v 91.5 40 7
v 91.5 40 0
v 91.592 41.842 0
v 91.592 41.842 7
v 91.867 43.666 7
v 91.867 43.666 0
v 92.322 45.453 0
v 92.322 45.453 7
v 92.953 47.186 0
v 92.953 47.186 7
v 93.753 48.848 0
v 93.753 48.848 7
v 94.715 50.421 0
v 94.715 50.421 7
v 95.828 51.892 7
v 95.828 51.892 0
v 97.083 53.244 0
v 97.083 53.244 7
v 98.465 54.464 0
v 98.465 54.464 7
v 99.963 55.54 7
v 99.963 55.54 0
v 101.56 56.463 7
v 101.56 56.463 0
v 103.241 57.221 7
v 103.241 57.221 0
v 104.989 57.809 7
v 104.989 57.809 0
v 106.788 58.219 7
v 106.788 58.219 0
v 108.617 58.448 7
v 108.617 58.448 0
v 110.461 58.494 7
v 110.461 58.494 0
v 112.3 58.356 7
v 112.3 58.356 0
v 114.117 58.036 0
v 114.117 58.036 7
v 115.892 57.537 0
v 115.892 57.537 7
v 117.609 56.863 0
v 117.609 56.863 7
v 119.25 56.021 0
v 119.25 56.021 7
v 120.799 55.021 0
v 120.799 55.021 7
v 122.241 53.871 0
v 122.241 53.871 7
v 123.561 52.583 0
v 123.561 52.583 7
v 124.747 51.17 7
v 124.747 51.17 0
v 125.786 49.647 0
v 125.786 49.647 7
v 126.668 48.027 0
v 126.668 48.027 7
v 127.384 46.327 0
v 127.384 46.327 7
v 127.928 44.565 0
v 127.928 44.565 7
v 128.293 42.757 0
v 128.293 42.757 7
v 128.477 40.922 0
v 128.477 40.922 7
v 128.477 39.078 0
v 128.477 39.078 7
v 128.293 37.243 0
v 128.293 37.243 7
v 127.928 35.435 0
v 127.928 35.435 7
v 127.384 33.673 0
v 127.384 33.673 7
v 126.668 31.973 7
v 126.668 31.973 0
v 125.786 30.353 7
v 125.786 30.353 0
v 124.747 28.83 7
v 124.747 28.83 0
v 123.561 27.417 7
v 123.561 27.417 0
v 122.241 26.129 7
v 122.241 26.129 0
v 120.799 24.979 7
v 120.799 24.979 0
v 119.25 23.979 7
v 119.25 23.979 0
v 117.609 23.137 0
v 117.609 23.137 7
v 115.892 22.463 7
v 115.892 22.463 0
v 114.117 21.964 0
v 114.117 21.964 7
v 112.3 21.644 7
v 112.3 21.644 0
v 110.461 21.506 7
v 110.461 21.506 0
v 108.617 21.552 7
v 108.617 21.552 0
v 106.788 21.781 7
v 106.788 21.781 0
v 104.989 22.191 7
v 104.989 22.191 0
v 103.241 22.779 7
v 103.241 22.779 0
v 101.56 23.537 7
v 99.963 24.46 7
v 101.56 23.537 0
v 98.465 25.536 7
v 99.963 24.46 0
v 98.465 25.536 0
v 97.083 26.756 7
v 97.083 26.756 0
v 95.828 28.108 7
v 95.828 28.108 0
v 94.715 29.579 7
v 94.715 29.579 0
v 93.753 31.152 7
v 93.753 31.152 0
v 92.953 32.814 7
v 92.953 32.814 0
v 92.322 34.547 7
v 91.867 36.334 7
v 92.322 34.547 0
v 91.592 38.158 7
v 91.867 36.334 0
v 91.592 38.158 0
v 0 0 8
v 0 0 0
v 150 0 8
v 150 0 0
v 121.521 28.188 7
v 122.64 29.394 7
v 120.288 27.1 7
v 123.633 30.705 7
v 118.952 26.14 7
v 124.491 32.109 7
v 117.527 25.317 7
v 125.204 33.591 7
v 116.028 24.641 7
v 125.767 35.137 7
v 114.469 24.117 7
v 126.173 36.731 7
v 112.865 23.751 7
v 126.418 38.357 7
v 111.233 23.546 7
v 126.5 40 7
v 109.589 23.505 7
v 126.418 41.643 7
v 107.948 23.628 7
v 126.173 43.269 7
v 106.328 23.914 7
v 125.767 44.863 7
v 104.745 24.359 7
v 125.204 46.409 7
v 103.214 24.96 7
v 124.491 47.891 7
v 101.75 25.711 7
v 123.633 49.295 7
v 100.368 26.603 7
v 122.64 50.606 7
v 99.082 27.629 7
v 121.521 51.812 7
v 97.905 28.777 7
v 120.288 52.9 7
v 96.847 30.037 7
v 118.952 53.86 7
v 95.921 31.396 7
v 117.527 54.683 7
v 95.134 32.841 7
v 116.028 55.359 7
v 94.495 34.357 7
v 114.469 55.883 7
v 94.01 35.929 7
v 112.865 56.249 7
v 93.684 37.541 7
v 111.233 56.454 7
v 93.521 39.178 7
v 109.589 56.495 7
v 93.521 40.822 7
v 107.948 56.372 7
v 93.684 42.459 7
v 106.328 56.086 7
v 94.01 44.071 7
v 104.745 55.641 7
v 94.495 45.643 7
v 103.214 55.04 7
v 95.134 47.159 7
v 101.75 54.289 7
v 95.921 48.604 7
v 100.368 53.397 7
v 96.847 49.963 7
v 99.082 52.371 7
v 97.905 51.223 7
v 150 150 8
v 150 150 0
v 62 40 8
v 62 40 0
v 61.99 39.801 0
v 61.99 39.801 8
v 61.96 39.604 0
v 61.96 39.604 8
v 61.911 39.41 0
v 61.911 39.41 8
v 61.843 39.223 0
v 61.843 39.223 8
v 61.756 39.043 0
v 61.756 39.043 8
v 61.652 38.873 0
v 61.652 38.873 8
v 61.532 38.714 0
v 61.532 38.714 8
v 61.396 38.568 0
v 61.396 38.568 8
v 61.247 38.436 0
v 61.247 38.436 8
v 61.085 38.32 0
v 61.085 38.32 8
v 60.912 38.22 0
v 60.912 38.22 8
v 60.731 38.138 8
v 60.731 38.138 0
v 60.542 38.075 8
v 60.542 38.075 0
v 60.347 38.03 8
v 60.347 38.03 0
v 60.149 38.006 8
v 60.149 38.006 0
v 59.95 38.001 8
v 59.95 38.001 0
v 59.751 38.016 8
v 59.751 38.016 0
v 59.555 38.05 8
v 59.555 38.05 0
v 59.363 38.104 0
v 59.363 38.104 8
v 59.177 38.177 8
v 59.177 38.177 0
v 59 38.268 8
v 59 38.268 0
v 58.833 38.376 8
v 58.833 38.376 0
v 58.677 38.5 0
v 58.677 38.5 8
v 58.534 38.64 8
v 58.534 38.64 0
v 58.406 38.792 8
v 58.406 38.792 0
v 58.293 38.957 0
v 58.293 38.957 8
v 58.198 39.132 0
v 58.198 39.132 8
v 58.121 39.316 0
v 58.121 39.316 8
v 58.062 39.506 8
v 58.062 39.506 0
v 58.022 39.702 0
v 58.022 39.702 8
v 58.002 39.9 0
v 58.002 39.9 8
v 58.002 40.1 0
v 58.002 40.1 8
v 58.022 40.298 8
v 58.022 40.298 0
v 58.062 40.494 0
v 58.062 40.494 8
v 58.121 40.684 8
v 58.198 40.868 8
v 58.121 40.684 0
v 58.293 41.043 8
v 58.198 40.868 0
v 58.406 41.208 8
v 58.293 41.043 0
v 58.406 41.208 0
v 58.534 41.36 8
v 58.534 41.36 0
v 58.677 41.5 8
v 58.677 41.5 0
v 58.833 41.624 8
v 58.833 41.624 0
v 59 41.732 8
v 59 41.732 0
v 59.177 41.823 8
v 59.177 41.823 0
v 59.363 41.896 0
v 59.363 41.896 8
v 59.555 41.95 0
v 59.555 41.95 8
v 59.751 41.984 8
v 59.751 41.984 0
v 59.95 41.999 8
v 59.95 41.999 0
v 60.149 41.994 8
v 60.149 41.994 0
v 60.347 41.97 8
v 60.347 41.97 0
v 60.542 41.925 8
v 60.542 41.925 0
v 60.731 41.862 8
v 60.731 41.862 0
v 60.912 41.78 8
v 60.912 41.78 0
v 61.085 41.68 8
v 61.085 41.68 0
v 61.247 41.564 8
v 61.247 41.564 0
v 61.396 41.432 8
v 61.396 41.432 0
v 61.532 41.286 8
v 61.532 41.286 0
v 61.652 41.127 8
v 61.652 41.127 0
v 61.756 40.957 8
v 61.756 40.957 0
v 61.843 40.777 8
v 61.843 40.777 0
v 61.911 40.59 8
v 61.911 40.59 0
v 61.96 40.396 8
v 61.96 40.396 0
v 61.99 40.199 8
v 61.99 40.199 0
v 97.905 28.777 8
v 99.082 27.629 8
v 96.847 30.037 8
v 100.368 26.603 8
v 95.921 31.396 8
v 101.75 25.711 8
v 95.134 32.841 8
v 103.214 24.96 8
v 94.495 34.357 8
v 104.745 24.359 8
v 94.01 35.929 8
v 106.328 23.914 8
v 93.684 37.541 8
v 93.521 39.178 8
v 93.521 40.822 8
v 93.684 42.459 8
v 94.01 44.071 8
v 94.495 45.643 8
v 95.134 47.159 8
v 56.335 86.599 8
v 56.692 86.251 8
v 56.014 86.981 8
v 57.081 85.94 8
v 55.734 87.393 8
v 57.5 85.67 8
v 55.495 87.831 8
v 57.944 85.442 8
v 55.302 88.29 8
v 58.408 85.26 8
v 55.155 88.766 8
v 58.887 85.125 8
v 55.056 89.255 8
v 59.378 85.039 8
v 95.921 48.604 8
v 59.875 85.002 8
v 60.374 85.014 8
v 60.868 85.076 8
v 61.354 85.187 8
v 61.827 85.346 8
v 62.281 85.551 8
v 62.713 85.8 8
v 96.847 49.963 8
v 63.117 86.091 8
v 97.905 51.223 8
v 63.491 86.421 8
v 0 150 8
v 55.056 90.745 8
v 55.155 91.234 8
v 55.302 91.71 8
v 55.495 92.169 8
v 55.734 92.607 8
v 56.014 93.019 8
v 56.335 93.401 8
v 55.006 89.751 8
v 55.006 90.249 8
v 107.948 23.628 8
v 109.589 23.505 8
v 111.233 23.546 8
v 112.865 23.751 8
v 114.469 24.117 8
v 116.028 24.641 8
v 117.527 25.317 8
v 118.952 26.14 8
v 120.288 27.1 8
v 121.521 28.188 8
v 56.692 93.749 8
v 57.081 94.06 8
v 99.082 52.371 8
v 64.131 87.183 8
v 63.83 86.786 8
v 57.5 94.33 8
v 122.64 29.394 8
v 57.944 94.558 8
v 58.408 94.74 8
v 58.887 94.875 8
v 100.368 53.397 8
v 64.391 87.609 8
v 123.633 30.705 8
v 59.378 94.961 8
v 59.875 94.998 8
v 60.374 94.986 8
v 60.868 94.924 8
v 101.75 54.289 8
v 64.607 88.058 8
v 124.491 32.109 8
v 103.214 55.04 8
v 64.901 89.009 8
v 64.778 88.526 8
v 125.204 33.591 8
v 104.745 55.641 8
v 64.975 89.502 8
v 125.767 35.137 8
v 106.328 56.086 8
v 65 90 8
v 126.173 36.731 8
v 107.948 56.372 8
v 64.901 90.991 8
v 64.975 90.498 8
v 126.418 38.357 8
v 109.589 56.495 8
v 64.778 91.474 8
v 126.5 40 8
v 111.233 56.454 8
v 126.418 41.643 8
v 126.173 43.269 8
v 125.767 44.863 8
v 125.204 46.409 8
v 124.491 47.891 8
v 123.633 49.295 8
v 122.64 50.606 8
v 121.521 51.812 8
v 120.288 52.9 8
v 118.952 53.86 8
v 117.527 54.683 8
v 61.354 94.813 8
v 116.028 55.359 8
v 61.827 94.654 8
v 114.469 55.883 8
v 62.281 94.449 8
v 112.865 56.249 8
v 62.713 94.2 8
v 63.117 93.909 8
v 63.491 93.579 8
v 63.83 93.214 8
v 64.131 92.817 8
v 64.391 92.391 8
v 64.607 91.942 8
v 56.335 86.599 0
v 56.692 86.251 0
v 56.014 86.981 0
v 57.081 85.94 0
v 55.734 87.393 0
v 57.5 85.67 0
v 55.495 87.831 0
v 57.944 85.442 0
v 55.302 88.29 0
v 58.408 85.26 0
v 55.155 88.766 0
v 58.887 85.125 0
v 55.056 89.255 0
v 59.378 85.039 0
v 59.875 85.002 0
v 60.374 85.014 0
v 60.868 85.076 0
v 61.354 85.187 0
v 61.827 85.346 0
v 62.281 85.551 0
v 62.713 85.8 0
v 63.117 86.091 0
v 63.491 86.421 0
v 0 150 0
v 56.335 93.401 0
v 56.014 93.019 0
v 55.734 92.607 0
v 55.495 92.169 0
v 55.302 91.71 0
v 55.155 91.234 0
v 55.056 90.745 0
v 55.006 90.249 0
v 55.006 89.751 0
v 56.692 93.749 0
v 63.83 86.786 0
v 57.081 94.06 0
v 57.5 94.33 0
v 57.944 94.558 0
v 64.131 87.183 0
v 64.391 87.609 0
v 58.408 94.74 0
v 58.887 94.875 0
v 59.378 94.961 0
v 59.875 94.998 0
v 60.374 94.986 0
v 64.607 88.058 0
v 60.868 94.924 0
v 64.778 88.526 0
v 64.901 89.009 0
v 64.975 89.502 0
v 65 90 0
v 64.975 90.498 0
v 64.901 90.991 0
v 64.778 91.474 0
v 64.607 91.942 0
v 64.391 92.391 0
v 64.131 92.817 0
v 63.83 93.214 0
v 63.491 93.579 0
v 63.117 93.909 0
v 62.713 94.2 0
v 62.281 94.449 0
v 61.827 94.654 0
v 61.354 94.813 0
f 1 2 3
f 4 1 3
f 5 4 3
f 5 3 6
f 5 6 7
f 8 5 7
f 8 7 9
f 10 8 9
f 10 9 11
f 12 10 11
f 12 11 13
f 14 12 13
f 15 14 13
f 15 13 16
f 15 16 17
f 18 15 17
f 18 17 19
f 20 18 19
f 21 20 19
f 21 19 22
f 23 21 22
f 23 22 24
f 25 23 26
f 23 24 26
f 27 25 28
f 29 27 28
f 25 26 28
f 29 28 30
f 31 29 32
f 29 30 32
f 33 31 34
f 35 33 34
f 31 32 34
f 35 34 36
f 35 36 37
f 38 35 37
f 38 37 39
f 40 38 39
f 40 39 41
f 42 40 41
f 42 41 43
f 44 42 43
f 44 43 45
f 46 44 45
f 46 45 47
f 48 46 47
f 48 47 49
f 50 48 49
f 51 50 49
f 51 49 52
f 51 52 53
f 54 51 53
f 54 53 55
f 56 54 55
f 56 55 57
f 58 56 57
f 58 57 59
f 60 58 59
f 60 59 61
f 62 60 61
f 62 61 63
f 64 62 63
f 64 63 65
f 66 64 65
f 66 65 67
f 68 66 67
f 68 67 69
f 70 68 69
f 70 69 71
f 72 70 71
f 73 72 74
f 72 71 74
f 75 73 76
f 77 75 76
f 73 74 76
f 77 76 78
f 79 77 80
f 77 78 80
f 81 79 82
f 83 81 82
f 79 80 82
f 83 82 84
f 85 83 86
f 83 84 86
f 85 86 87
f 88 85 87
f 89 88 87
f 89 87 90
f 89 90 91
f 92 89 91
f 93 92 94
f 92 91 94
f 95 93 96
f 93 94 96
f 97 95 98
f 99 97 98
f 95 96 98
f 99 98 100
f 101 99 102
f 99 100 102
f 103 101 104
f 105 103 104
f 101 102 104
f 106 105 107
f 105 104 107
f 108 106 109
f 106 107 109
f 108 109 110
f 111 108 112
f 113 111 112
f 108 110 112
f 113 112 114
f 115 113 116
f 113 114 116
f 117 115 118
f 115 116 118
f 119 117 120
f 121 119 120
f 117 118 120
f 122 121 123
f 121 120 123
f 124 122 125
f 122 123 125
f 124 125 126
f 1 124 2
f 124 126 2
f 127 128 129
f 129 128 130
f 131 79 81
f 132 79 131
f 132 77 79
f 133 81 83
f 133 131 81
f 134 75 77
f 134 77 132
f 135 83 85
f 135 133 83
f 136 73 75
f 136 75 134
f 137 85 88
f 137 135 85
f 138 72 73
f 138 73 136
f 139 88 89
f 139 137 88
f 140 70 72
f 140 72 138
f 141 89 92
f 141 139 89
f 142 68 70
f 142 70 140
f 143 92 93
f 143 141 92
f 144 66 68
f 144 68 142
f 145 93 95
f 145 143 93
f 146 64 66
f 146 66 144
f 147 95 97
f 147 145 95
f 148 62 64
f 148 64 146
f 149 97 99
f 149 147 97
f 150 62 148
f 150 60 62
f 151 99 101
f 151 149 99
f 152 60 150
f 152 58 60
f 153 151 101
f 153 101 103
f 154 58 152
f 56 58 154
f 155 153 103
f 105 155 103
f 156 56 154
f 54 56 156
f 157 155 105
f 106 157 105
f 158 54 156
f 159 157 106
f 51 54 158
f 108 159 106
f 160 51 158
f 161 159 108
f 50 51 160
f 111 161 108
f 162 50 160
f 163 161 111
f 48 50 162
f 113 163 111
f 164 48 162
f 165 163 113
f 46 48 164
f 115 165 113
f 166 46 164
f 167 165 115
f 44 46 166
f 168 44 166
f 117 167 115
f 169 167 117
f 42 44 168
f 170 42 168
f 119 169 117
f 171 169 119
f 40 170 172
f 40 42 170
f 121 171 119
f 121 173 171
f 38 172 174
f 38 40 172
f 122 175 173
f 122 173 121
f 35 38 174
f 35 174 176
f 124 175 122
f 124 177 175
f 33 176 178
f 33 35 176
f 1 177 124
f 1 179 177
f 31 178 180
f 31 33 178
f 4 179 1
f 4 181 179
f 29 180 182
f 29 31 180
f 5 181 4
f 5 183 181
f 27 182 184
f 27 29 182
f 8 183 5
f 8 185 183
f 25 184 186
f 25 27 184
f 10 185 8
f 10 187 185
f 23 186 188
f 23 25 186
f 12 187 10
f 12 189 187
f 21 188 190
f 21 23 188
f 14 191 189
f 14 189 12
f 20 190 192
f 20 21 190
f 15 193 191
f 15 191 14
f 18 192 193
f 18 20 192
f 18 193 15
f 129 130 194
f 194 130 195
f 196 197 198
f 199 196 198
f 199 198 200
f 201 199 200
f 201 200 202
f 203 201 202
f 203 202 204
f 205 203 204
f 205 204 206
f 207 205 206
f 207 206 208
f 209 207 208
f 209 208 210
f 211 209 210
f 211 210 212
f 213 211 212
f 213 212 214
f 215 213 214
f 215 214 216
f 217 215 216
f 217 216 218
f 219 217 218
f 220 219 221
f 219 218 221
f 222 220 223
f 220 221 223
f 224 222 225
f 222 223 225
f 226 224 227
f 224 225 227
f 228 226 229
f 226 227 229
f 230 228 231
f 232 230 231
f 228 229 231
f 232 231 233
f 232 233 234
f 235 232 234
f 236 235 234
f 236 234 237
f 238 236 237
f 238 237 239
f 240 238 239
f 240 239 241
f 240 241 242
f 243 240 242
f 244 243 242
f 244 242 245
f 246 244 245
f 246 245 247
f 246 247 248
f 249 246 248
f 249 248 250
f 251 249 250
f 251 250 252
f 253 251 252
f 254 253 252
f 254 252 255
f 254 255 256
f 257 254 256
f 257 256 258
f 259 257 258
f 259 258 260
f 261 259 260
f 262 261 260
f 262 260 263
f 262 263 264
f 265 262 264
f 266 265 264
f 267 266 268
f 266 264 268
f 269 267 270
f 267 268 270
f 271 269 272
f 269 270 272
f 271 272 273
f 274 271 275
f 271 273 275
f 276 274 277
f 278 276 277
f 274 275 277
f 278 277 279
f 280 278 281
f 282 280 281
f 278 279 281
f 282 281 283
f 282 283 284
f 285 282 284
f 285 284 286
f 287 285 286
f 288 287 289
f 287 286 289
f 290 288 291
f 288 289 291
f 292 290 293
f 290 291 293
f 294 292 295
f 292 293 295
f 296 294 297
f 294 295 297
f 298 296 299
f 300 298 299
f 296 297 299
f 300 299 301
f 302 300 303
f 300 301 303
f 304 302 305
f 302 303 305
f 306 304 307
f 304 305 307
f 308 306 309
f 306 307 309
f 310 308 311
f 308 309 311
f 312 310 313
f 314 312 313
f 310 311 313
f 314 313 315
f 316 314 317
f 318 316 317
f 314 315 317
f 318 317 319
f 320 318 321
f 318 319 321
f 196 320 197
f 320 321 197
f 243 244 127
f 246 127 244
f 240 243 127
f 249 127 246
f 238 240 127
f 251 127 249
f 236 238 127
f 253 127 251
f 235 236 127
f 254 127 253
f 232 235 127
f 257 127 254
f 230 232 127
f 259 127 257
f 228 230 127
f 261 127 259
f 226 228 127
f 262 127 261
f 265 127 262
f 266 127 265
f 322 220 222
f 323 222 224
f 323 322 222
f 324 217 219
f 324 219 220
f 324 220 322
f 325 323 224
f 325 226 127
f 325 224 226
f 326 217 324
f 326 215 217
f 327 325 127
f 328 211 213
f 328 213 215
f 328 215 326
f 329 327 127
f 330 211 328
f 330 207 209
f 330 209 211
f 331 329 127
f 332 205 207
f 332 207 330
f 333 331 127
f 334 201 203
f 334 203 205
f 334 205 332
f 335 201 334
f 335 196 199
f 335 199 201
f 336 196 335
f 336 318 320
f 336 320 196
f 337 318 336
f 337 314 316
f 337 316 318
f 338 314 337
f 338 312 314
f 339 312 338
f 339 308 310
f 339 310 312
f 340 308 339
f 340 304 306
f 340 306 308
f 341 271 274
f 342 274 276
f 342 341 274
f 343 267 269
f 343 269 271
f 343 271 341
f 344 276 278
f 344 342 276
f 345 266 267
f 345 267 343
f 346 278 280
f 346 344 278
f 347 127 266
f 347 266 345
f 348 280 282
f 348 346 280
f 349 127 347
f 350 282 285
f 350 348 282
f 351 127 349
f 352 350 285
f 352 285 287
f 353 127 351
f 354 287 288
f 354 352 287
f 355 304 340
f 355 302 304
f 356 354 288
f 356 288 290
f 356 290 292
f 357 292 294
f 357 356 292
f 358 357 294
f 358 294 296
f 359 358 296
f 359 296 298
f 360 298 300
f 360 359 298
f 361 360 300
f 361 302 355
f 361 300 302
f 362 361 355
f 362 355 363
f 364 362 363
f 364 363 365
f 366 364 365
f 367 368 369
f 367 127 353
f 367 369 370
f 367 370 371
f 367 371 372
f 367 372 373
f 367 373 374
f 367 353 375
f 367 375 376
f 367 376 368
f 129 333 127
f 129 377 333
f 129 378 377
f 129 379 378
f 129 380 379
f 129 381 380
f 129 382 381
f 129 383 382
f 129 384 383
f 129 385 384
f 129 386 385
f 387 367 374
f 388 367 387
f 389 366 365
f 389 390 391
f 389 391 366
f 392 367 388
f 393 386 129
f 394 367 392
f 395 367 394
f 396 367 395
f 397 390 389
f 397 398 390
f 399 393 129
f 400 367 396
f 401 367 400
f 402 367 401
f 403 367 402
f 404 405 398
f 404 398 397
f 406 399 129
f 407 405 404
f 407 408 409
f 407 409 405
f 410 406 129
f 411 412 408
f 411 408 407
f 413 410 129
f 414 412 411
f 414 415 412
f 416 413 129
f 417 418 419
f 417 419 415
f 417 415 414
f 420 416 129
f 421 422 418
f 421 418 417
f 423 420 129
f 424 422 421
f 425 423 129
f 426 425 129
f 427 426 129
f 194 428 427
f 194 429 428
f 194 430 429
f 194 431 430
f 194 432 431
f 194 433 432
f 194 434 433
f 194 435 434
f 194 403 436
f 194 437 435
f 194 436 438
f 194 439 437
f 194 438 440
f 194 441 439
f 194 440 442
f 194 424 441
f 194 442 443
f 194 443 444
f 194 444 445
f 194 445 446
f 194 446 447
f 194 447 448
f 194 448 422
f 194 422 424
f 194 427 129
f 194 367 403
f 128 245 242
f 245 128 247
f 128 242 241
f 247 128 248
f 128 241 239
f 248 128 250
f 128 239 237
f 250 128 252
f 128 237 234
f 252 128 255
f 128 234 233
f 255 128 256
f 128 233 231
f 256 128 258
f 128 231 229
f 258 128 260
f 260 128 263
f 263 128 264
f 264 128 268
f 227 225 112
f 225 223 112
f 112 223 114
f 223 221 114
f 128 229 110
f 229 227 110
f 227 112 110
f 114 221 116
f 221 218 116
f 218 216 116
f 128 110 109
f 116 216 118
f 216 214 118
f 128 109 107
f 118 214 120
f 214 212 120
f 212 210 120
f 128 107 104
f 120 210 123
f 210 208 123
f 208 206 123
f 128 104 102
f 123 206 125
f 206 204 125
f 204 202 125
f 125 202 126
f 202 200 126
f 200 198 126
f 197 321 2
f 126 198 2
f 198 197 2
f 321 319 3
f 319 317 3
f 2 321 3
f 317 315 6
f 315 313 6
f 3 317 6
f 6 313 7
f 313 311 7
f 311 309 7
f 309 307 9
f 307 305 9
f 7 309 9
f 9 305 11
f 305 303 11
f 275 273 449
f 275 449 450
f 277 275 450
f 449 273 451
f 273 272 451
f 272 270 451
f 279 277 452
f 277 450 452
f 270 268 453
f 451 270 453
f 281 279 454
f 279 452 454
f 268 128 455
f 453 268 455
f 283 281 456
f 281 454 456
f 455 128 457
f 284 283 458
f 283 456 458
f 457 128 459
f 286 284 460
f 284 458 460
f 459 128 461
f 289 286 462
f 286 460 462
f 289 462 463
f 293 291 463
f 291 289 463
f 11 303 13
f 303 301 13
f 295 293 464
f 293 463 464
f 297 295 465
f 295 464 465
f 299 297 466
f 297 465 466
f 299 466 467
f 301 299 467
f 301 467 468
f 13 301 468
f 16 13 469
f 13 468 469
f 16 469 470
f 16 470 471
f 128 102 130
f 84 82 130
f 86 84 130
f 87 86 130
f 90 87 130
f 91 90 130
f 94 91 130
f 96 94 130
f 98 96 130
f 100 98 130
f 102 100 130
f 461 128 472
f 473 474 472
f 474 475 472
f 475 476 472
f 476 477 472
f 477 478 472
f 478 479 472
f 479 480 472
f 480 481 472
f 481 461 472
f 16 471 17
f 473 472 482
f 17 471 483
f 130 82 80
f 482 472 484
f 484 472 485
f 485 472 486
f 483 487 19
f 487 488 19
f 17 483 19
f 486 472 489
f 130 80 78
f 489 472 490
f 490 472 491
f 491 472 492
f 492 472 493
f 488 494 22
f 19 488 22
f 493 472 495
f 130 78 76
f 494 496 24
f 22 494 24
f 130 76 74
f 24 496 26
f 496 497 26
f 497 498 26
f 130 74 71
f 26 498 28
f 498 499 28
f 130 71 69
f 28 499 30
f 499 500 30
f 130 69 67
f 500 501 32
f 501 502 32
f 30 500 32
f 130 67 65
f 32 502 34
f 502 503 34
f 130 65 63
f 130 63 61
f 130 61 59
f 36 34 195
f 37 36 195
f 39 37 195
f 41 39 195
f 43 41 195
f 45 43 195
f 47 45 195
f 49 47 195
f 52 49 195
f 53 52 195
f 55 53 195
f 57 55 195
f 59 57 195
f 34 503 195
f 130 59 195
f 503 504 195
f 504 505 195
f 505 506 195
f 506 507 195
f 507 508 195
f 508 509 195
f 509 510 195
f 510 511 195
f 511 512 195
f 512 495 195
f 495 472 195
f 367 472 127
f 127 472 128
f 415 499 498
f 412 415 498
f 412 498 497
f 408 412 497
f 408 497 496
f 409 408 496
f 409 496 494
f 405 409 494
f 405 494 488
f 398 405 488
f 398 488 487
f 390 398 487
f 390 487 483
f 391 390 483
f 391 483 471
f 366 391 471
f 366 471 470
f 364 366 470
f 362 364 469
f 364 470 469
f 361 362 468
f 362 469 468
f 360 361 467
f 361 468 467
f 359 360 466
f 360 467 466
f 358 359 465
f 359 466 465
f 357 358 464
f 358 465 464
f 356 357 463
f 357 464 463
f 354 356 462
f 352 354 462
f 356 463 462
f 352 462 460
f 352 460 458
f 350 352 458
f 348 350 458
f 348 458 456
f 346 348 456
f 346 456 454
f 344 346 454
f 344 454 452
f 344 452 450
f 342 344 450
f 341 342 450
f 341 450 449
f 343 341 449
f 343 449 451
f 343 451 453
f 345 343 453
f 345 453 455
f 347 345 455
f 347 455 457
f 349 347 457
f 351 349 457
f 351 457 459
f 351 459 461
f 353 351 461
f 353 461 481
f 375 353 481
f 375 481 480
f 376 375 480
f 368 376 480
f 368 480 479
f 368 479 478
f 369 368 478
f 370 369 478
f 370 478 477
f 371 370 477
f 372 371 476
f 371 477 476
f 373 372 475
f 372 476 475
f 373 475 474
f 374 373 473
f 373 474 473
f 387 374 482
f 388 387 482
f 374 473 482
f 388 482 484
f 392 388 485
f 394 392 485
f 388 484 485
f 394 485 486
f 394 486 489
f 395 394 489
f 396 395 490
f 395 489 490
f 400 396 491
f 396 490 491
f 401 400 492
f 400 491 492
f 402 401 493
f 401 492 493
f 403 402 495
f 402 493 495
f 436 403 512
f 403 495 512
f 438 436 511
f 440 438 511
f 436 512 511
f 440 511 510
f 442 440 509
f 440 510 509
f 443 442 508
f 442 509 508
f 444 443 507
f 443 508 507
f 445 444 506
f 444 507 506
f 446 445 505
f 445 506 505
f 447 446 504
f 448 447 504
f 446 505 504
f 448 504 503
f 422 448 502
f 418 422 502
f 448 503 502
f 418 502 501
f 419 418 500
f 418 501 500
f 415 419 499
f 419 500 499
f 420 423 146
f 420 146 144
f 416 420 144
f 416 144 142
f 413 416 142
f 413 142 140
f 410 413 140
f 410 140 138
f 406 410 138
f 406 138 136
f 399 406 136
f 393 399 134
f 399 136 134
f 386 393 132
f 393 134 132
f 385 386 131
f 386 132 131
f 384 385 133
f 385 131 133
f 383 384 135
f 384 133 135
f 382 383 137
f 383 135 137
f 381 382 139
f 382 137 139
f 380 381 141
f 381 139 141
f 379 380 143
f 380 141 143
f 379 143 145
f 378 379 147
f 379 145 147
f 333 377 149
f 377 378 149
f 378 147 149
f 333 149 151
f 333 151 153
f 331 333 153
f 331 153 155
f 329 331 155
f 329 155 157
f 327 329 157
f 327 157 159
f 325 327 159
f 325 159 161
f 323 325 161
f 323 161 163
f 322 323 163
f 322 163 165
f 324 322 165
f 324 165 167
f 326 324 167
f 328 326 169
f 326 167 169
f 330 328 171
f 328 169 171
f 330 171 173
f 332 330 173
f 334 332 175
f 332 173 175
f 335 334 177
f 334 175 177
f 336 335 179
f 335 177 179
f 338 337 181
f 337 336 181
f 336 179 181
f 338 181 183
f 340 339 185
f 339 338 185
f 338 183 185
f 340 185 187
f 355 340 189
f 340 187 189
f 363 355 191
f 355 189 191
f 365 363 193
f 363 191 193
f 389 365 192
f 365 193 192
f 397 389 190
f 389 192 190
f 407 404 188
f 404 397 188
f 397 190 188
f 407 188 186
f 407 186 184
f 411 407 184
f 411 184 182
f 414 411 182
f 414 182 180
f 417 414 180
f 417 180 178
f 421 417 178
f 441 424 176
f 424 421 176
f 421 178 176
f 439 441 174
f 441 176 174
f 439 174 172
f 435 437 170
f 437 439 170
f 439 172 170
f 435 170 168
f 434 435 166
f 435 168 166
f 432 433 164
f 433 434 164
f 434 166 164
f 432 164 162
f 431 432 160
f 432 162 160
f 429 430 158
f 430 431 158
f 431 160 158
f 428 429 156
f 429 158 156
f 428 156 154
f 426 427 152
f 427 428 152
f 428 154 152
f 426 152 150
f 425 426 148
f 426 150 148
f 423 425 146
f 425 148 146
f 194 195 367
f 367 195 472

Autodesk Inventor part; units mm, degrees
ref_plane "YZ Plane" through (0, 0, 0) normal (1, 0, 0) x (0, 1, 0)
ref_plane "XZ Plane" through (0, 0, 0) normal (0, 1, 0) x (-1, 0, 0)
ref_plane "XY Plane" through (0, 0, 0) normal (0, 0, 1) x (1, 0, 0)
sketch "Sketch1" plane through (0, 0, 0) normal (0, 0, 1) x (1, 0, 0)
  line L0 (0, 0) -> (150, 0)
  line L1 (150, 0) -> (150, 150)
  line L2 (150, 150) -> (0, 150)
  line L3 (0, 150) -> (0, 0)
  circle A0 centre (110, 40) radius 16.5
  circle A1 centre (60, 40) radius 2
  line L4 (60, 40) -> (60, 90)
  circle A2 centre (60, 90) radius 5
  dimension "d0" = 150
  dimension "d1" = 150
  dimension "d2" = 33
  dimension "d3" = 4
  dimension "d4" = 50
  dimension "d5" = 10
extrude "Extrusion1" add sketch "Sketch1" along normal blind 8
sketch "Sketch2" plane through (0, 0, 0) normal (0, 0, -1) x (-1, 0, 0)
  circle A0 centre (-110, 40) radius 18.5
  point P0 (0, 0)
  dimension "d8" = 37
extrude "Extrusion2" cut sketch "Sketch2" against normal blind 7
properties part number "cote gauche"
